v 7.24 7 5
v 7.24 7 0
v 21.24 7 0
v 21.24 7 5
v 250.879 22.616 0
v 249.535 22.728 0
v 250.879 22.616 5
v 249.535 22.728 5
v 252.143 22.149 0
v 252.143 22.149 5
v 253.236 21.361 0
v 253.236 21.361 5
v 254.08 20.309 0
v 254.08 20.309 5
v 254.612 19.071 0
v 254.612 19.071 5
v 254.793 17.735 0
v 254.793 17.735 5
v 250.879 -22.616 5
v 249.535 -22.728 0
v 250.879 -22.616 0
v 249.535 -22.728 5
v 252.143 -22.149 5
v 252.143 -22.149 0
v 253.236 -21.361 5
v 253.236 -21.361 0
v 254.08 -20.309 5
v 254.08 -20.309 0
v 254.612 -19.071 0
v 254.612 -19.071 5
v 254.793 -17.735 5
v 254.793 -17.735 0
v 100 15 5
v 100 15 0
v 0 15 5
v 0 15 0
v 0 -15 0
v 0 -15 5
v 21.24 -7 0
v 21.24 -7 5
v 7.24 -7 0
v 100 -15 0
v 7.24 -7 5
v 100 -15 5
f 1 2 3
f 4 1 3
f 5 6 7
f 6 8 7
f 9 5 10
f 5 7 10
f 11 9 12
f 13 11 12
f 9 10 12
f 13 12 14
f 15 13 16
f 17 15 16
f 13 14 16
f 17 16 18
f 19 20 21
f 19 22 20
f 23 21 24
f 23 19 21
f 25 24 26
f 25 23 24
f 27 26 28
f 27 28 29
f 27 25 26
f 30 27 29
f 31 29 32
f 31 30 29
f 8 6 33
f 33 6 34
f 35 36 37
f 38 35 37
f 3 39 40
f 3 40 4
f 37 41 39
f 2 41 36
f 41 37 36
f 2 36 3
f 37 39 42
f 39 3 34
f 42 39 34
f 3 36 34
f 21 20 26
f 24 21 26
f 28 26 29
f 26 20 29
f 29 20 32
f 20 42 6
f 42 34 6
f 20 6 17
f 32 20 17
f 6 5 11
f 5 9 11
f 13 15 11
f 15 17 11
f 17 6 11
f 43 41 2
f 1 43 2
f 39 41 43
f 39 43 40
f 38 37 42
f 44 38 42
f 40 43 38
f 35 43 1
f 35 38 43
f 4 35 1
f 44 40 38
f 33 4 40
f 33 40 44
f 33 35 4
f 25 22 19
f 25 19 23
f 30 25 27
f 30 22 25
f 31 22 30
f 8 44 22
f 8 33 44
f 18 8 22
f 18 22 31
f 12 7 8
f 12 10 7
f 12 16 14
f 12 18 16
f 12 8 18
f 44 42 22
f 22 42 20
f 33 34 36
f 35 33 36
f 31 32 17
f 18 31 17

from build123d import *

# Parameters (mm, degrees)
F1_DEPTH = 5
F2_W     = 14
F2_H     = 14
F3_DEPTH = 5
F4_R     = 5


with BuildPart() as f1:
    # F0 (on Top) → F1 (new body)
    with BuildSketch(Plane.XY):
        Polygon((0, 15), (0, 0), (0, -15), (100, -15), (254.793411, -23), (254.793411, 0), (254.793411, 23), (100, 15), align=None)
    extrude(amount=F1_DEPTH)

    # F2 (on Top) → F3 (cut, through all)
    with BuildSketch(Plane.XY):
        with Locations((14.239932, 0)):
            Rectangle(F2_W, F2_H)
    extrude(amount=F3_DEPTH, mode=Mode.SUBTRACT)

    # F4
    f4_edges = [f1.edges().sort_by_distance(p)[0] for p in [
        (254.793411, -23, 2.5),
        (254.793411, 23, 2.5),
    ]]
    fillet(f4_edges, radius=F4_R)


solid = f1.part
